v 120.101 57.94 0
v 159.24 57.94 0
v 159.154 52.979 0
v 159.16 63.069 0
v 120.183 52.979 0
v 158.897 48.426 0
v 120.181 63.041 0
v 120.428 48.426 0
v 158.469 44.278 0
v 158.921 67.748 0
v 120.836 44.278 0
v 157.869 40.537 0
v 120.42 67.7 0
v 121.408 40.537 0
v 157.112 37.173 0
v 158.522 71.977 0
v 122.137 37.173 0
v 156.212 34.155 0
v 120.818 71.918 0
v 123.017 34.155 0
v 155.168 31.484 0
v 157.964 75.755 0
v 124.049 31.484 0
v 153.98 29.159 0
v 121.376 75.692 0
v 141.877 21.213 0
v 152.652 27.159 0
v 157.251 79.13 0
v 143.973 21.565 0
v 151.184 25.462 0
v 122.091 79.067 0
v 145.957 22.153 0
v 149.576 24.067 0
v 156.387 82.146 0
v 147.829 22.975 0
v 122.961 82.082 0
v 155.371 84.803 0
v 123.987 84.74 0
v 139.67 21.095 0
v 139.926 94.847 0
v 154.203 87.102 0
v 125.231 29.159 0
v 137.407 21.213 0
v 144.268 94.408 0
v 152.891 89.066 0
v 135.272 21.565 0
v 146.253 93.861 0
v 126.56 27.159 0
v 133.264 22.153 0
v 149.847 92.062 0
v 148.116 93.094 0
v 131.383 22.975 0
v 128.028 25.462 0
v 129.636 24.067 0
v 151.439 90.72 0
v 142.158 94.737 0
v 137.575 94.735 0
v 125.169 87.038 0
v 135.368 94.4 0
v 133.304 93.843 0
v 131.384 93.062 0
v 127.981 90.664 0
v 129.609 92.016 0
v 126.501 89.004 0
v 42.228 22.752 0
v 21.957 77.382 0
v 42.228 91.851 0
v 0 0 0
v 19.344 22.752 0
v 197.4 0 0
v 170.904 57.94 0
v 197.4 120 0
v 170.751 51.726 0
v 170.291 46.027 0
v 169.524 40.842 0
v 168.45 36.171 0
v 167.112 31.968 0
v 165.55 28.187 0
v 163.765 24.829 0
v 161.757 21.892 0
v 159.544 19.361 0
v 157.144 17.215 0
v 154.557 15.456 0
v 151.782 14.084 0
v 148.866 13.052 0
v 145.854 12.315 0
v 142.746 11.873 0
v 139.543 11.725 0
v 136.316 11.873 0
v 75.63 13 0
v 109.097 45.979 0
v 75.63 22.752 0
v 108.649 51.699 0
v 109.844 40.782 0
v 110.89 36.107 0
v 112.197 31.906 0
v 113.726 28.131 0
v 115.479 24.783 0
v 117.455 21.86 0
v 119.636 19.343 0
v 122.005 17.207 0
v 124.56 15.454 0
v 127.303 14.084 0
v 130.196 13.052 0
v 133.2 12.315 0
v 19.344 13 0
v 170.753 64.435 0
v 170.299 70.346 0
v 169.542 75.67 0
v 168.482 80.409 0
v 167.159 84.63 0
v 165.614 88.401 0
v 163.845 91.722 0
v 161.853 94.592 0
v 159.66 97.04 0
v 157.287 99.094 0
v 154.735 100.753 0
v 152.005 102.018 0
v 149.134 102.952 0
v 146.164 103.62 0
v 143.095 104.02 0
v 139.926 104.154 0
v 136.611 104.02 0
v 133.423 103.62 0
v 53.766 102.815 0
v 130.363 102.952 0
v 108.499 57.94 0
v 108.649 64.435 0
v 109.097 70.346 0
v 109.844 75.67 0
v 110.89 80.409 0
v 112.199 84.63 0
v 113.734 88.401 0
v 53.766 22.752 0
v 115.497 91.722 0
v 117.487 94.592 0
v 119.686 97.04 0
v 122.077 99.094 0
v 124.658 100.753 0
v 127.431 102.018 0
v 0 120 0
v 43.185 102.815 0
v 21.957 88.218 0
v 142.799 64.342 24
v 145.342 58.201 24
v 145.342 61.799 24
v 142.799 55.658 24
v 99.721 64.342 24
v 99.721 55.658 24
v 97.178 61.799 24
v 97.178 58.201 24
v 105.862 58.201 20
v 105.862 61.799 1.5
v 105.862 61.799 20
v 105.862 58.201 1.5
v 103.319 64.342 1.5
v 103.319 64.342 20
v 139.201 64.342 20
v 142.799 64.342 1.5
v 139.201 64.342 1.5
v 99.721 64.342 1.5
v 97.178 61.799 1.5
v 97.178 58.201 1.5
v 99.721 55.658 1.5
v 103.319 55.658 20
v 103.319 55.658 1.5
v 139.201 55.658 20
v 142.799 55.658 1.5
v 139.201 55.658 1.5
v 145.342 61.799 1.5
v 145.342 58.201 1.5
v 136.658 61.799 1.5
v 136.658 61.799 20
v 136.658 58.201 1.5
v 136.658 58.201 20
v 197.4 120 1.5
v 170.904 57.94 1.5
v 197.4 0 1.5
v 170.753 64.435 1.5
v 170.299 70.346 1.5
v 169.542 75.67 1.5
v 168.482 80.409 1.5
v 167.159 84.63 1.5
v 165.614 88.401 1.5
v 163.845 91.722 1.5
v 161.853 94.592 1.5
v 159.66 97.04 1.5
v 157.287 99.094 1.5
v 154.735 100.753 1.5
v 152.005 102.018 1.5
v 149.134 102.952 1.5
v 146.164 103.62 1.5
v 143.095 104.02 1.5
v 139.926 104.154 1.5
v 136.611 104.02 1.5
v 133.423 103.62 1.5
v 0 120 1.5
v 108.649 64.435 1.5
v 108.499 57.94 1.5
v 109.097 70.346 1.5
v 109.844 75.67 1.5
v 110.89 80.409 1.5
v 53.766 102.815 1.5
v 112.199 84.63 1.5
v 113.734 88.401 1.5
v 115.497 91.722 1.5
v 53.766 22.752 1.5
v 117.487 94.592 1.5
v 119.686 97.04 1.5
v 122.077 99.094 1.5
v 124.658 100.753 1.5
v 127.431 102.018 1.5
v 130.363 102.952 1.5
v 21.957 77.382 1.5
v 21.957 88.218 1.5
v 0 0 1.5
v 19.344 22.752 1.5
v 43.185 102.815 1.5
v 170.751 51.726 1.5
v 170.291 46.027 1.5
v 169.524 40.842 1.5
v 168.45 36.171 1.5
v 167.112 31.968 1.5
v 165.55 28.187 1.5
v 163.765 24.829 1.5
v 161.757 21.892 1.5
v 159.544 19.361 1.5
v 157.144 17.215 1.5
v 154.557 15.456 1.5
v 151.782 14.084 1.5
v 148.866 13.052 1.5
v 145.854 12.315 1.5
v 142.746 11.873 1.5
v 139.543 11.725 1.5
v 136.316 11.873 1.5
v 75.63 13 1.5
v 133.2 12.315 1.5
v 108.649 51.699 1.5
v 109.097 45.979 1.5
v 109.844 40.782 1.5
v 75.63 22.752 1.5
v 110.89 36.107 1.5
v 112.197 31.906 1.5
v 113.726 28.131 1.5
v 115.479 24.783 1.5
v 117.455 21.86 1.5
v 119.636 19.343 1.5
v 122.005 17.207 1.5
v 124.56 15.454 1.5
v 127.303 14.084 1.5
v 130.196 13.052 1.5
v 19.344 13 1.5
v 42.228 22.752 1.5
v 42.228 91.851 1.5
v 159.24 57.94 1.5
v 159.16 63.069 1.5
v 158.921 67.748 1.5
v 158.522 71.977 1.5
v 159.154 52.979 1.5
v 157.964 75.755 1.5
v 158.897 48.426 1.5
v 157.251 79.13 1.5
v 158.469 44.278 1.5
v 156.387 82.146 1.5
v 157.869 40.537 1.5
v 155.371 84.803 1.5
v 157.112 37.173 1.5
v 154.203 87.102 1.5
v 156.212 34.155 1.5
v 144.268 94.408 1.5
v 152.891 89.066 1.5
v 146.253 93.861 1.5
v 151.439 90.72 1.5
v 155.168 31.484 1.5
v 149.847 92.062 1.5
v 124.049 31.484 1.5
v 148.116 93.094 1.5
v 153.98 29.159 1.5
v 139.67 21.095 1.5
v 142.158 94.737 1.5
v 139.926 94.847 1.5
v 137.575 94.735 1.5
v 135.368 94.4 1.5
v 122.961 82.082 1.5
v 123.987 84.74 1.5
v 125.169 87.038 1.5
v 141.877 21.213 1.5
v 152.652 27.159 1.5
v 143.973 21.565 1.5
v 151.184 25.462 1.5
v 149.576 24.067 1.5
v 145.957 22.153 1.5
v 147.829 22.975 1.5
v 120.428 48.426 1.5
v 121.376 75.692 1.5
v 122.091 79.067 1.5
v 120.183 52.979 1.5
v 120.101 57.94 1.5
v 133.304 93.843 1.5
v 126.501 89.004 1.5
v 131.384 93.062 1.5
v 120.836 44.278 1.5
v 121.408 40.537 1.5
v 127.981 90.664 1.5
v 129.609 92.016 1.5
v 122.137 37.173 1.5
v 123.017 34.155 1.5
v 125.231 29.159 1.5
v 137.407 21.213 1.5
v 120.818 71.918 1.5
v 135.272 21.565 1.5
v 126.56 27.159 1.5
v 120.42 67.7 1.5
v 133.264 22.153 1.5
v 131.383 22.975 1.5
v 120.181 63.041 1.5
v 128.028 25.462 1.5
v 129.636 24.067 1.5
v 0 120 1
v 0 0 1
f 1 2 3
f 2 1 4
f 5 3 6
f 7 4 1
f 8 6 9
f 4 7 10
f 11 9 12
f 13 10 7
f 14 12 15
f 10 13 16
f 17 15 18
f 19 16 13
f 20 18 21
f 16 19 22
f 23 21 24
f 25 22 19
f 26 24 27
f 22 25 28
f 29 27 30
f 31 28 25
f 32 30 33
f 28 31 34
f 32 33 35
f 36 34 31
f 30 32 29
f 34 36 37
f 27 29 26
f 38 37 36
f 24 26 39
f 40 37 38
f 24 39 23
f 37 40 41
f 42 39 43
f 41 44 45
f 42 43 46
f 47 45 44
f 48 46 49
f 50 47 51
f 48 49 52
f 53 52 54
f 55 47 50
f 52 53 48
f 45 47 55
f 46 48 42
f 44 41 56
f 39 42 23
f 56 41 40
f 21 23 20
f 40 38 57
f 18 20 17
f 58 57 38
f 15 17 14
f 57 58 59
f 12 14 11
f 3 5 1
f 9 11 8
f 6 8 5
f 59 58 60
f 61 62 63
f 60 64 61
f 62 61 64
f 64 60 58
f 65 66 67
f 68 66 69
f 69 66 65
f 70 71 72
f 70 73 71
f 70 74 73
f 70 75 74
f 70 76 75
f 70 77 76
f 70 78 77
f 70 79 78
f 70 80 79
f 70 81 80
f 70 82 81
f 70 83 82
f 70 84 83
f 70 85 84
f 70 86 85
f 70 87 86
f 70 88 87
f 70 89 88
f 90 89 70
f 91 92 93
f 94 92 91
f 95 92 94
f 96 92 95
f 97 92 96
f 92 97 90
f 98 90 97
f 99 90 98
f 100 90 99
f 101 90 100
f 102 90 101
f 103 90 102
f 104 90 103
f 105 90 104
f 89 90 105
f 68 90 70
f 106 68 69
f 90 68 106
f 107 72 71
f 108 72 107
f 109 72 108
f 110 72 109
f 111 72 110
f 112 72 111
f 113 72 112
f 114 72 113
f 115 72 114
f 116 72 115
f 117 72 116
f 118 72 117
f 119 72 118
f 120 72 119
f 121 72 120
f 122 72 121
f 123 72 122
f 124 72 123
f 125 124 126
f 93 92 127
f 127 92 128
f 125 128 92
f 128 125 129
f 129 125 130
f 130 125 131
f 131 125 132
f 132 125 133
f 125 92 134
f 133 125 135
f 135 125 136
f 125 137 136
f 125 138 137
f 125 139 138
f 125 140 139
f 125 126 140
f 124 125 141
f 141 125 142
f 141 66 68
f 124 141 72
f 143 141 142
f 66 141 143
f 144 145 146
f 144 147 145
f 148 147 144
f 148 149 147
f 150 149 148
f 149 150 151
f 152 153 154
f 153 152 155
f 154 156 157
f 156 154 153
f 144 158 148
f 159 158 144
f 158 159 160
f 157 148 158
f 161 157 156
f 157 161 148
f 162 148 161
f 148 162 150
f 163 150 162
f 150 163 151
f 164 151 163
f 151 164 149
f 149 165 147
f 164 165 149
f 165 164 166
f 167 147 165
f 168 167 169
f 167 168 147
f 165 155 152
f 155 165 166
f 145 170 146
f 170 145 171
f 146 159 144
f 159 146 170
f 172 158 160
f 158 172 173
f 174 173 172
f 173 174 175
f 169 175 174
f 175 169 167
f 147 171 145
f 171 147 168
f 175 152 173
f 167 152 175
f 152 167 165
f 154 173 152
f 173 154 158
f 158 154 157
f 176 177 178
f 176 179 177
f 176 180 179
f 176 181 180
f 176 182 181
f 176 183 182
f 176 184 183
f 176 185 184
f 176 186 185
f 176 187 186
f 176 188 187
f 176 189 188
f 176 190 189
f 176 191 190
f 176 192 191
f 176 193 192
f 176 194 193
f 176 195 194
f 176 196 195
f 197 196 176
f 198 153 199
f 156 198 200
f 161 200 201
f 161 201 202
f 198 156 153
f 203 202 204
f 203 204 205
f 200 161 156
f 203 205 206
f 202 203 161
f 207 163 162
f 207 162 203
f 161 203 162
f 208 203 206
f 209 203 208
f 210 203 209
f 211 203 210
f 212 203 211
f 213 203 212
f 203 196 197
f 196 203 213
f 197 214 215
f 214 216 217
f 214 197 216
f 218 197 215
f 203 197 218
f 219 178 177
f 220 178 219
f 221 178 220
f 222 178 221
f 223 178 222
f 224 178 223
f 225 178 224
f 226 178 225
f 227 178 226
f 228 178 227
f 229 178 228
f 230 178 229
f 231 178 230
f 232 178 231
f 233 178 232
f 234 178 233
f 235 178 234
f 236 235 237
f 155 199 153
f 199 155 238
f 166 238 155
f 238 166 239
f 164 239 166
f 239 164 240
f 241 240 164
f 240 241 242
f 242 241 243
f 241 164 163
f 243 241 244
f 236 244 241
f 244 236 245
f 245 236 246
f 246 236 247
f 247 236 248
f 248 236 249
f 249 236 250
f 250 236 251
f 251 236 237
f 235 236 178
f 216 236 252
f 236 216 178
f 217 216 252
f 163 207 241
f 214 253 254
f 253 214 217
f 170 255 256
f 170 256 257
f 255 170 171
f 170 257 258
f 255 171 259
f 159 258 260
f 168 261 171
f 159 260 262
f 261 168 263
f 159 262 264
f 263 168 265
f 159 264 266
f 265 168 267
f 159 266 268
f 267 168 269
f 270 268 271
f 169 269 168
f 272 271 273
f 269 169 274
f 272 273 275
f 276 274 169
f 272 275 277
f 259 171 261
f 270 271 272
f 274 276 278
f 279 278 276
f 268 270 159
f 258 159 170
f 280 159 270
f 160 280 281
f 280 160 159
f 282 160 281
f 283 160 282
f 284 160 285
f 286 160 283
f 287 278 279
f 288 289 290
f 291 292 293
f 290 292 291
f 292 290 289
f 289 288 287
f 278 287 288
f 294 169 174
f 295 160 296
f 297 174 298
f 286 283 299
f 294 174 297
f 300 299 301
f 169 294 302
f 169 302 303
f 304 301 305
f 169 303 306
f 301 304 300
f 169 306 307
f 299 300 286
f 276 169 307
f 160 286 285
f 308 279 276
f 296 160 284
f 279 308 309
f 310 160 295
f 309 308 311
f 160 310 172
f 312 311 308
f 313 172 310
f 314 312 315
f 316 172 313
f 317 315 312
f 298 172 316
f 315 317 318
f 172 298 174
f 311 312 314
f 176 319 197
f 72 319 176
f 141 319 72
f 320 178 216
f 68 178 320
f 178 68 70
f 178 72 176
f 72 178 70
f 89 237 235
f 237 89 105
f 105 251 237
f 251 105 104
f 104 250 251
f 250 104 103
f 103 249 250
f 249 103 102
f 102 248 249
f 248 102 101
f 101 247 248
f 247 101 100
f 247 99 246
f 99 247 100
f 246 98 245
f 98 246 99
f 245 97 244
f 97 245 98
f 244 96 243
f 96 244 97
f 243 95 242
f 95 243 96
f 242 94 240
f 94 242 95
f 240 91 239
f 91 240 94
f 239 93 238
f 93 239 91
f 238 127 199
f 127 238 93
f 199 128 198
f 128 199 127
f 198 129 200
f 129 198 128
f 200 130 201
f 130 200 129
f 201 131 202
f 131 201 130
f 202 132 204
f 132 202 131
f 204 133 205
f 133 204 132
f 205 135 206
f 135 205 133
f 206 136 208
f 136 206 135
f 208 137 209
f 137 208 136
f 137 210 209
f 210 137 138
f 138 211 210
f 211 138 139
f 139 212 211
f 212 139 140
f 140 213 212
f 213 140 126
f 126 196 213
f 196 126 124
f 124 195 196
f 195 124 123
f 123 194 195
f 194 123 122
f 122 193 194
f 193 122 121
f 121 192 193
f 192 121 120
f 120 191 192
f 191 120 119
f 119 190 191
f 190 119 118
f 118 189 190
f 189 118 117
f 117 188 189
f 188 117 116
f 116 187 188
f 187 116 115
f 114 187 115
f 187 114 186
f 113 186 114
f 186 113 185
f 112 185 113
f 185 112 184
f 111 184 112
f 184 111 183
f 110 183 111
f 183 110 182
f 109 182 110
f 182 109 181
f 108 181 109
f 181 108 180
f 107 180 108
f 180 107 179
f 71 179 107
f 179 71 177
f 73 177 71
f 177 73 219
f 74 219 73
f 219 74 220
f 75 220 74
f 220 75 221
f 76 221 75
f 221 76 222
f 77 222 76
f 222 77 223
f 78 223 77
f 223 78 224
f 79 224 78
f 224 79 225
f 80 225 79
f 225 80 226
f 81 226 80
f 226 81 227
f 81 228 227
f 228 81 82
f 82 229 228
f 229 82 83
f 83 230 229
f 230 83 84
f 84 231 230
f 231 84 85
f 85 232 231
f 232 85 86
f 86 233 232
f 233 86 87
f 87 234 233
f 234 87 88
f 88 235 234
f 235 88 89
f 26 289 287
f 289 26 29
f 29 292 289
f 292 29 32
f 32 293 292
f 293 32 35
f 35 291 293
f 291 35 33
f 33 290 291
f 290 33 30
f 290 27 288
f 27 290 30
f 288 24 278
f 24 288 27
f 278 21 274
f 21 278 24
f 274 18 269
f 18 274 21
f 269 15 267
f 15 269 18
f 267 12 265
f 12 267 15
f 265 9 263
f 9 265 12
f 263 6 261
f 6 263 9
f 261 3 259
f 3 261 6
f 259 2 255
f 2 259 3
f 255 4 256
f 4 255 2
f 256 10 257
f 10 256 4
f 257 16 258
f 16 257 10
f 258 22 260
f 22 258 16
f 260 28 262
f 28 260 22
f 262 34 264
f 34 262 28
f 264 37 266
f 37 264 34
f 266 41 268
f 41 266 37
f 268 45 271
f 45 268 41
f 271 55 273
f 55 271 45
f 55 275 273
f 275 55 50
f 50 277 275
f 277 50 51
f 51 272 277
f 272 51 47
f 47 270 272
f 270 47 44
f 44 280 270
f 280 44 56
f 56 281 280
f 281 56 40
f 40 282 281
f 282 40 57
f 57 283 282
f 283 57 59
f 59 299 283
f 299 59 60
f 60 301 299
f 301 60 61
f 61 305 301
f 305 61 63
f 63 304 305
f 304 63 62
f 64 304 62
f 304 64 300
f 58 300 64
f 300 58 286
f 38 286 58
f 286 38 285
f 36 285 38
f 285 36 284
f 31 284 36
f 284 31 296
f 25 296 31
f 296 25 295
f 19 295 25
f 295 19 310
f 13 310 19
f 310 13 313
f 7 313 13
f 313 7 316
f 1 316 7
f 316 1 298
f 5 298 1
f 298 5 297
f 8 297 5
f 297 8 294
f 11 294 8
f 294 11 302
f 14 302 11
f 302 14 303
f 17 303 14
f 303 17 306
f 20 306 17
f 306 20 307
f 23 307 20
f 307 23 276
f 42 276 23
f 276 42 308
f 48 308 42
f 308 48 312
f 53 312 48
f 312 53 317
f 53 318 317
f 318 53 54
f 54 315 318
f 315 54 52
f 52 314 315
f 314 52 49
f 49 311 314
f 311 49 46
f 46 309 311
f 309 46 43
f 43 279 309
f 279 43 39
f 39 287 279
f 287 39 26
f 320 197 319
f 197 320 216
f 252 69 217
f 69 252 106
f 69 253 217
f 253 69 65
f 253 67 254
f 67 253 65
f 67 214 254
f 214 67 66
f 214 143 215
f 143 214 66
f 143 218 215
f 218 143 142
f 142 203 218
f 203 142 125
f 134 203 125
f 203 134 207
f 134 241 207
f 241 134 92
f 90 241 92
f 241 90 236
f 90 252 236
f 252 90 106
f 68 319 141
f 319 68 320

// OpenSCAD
digits = "10";
size = 94;
stencilThickness = 1;
handleHeight = 20;
handleThickness = 4;
verticalMargin = 13;
horizontalMargin = 0;

module handle(p1,p2,r=10,height=20,thickness=5,sides=8) {
    angle = atan2(p2[1]-p1[1],p2[0]-p1[0]) + 180/sides;
    module base() {
        translate(p1) rotate(angle) circle(r=r,$fn=sides);
        translate(p2) rotate(angle) circle(r=r,$fn=sides);
    }
    linear_extrude(height=height+thickness) base();
    translate([0,0,height])
    linear_extrude(height=thickness) hull() base();
}

module digit(d,size=100,thickness=1.5,handleHeight=20,handleThickness=4, hMargin=20,vMargin=20) {
    
        function s(x) = x/100*size;

    translate([hMargin,vMargin]) union() {
        linear_extrude(height=thickness)
        difference() {
            translate([-hMargin,-vMargin]) square([size*.9+2*hMargin,2*vMargin+size]);
            text(d,font="Arial:style=black",size=size);
        }
        
        if (d=="0") {
            handle([s(-2),s(50)],[s(40),s(50)],s(5),height=handleHeight,thickness=handleThickness);
        }
        else if (d=="4") {
            handle([s(20),s(75)],[s(42),s(48)],s(5),height=handleHeight,thickness=handleThickness);
        }
        else if (d=="6") {
            handle([s(48),s(23)],[s(48),s(-9)],s(5),height=handleHeight,thickness=handleThickness);
        }
        else if (d=="8") {
            handle([s(45),s(22)],[s(45),s(-10)],s(5),height=handleHeight,thickness=handleThickness);
            handle([s(45),s(77)],[s(45),s(108)],s(5),height=handleHeight,thickness=handleThickness);
        }
        else if (d=="9") {
            handle([s(45),s(77)],[s(45),s(108)],s(5),height=handleHeight,thickness=handleThickness);
        }
    }
}

module digits(s,size=100,thickness=1.5,handleHeight=20,handleThickness=4, hMargin=20,vMargin=20,spacing=0.1) {
    nudge = 0.001;
    w = len(s)*(0.9+spacing)*size+spacing*size;
    cube([hMargin+nudge,vMargin*2+size,thickness]);
    translate([hMargin+w-nudge,0,0]) cube([hMargin+nudge,2*vMargin+size,thickness]);
    translate([hMargin,0,0]) {
        for (i=[0:len(s)-1]) {
            translate([i*(spacing+0.9)*size,0,0])
                digit(s[i],size=size,thicknesss=thickness,hMargin=size*spacing,vMargin=vMargin,handleHeight=handleHeight,handleThickness=handleThickness);
        }
    }
}

render(convexity=9)
digits(digits,size=size,thickness=stencilThickness,handleHeight=handleHeight,handleThickness=handleThickness,vMargin=verticalMargin,hMargin=horizontalMargin);
